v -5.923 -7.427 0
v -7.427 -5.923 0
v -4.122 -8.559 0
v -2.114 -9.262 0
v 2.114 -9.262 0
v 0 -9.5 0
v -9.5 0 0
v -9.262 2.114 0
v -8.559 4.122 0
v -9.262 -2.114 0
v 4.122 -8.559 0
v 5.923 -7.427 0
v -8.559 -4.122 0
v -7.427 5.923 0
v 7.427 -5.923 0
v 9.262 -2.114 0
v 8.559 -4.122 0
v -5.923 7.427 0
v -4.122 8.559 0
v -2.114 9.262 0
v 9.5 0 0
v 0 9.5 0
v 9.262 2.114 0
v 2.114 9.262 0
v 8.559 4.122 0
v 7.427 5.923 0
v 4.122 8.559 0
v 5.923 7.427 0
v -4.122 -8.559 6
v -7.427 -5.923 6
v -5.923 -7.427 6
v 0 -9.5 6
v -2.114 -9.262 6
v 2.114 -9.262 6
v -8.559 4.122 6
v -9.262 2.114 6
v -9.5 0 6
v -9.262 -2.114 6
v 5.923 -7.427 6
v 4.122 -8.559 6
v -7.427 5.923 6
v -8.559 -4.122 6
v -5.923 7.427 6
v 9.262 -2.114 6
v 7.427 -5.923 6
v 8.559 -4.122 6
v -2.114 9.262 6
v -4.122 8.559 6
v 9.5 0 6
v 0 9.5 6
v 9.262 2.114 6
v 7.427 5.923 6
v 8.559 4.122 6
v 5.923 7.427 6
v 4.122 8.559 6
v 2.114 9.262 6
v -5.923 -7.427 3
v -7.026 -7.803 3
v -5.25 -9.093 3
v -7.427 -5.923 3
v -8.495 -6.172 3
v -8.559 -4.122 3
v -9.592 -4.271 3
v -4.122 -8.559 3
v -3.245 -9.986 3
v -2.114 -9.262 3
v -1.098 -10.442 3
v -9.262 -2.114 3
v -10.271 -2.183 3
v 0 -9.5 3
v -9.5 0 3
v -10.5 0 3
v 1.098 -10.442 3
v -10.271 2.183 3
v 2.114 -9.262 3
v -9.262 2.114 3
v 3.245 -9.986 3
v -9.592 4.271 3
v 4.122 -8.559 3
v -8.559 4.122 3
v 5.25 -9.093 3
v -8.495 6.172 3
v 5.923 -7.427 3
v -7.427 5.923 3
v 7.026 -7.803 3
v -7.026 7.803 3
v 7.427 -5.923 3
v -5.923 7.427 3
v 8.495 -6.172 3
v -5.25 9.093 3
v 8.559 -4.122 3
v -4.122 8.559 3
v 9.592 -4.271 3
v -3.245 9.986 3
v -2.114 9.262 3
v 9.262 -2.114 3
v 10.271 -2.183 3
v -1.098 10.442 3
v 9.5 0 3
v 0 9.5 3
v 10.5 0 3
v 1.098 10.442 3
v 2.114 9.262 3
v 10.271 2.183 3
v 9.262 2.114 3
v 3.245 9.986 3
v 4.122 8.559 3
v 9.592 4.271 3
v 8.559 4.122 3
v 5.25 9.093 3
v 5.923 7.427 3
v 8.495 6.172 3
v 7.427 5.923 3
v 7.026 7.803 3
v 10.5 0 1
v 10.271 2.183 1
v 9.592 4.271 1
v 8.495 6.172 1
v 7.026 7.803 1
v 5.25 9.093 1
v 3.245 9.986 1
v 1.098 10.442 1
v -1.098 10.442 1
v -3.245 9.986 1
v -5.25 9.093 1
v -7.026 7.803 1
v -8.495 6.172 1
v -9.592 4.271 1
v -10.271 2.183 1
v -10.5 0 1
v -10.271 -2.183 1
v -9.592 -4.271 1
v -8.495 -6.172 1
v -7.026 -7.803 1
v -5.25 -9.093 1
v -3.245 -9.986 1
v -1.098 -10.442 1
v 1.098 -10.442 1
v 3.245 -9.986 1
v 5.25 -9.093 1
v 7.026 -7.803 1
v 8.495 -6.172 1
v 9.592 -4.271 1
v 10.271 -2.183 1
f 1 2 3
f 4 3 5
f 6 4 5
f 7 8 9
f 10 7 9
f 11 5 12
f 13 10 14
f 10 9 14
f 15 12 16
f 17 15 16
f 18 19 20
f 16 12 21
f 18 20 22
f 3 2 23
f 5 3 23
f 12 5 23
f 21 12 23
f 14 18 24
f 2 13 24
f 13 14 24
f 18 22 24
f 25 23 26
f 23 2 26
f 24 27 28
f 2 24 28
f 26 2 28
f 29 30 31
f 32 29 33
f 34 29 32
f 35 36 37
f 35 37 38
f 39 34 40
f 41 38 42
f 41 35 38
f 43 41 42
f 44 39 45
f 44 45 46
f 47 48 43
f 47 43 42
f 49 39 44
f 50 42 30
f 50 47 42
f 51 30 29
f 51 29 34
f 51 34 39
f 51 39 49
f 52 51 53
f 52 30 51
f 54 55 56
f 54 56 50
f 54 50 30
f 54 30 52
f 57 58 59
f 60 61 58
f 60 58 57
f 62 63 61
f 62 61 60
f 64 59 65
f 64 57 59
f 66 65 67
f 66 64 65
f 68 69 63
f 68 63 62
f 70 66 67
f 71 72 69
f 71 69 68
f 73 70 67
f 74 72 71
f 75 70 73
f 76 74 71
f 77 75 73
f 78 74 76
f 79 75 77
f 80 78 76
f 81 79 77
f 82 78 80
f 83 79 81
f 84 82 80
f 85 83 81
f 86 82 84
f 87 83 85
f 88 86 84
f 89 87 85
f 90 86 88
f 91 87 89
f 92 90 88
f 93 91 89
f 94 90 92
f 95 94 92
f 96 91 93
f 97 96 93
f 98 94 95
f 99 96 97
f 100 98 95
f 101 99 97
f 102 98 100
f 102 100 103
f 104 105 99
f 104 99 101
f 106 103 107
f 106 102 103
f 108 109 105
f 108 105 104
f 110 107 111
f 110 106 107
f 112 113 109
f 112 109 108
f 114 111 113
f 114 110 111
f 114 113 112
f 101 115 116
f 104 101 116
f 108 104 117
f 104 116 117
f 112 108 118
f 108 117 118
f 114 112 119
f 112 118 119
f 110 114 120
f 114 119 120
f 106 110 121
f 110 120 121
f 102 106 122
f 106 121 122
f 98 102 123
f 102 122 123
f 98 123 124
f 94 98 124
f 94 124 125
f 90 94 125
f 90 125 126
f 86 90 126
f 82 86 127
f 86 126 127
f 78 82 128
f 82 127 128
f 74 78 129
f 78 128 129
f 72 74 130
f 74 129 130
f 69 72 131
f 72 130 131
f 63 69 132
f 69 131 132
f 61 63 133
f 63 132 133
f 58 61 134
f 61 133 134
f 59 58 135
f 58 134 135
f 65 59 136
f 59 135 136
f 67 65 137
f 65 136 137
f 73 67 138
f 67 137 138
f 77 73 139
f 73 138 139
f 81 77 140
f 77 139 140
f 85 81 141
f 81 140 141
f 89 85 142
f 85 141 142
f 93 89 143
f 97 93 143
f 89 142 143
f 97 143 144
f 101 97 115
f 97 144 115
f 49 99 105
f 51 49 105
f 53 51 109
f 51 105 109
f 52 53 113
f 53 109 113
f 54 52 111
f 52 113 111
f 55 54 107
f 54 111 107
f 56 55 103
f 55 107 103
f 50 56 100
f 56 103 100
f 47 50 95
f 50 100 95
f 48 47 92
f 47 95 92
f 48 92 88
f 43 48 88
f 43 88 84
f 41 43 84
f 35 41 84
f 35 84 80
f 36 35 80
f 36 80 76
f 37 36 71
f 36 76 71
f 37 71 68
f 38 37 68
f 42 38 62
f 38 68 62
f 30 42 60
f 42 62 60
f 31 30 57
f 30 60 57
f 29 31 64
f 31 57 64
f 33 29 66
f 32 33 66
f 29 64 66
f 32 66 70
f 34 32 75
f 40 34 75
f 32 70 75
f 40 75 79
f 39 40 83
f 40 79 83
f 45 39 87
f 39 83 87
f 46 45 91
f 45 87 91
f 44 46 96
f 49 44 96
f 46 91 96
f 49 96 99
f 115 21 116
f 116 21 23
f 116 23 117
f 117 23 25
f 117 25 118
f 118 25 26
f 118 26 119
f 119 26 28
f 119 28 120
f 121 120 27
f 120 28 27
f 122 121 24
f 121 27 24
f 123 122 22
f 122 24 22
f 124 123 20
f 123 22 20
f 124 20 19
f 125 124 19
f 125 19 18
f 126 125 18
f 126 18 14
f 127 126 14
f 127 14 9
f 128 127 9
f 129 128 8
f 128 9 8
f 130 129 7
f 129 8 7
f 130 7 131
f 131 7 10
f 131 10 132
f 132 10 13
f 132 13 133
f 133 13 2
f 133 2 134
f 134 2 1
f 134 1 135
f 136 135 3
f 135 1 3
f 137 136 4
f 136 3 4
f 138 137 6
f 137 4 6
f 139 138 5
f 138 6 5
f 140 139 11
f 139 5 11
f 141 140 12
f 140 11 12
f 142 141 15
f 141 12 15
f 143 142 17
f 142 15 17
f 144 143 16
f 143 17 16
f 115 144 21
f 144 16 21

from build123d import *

# Parameters (mm, degrees)
F0_R     = 10.5
F1_DEPTH = 3
F2_SIZE  = 1
F3_R     = 9.5
F4_DEPTH = 3


with BuildPart() as f1:
    # F0 (on Top) → F1 (new body)
    with BuildSketch(Plane.XY):
        Circle(F0_R)
    extrude(amount=F1_DEPTH)

    # F2
    f2_edges = [f1.edges().sort_by_distance(p)[0] for p in [
        (-10.5, 0, 0),
    ]]
    chamfer(f2_edges, length=F2_SIZE)

    # F3 (on face) → F4 (join)
    with BuildSketch(Plane.XY.offset(3)):
        Circle(F3_R)
    extrude(amount=F4_DEPTH)


solid = f1.part
